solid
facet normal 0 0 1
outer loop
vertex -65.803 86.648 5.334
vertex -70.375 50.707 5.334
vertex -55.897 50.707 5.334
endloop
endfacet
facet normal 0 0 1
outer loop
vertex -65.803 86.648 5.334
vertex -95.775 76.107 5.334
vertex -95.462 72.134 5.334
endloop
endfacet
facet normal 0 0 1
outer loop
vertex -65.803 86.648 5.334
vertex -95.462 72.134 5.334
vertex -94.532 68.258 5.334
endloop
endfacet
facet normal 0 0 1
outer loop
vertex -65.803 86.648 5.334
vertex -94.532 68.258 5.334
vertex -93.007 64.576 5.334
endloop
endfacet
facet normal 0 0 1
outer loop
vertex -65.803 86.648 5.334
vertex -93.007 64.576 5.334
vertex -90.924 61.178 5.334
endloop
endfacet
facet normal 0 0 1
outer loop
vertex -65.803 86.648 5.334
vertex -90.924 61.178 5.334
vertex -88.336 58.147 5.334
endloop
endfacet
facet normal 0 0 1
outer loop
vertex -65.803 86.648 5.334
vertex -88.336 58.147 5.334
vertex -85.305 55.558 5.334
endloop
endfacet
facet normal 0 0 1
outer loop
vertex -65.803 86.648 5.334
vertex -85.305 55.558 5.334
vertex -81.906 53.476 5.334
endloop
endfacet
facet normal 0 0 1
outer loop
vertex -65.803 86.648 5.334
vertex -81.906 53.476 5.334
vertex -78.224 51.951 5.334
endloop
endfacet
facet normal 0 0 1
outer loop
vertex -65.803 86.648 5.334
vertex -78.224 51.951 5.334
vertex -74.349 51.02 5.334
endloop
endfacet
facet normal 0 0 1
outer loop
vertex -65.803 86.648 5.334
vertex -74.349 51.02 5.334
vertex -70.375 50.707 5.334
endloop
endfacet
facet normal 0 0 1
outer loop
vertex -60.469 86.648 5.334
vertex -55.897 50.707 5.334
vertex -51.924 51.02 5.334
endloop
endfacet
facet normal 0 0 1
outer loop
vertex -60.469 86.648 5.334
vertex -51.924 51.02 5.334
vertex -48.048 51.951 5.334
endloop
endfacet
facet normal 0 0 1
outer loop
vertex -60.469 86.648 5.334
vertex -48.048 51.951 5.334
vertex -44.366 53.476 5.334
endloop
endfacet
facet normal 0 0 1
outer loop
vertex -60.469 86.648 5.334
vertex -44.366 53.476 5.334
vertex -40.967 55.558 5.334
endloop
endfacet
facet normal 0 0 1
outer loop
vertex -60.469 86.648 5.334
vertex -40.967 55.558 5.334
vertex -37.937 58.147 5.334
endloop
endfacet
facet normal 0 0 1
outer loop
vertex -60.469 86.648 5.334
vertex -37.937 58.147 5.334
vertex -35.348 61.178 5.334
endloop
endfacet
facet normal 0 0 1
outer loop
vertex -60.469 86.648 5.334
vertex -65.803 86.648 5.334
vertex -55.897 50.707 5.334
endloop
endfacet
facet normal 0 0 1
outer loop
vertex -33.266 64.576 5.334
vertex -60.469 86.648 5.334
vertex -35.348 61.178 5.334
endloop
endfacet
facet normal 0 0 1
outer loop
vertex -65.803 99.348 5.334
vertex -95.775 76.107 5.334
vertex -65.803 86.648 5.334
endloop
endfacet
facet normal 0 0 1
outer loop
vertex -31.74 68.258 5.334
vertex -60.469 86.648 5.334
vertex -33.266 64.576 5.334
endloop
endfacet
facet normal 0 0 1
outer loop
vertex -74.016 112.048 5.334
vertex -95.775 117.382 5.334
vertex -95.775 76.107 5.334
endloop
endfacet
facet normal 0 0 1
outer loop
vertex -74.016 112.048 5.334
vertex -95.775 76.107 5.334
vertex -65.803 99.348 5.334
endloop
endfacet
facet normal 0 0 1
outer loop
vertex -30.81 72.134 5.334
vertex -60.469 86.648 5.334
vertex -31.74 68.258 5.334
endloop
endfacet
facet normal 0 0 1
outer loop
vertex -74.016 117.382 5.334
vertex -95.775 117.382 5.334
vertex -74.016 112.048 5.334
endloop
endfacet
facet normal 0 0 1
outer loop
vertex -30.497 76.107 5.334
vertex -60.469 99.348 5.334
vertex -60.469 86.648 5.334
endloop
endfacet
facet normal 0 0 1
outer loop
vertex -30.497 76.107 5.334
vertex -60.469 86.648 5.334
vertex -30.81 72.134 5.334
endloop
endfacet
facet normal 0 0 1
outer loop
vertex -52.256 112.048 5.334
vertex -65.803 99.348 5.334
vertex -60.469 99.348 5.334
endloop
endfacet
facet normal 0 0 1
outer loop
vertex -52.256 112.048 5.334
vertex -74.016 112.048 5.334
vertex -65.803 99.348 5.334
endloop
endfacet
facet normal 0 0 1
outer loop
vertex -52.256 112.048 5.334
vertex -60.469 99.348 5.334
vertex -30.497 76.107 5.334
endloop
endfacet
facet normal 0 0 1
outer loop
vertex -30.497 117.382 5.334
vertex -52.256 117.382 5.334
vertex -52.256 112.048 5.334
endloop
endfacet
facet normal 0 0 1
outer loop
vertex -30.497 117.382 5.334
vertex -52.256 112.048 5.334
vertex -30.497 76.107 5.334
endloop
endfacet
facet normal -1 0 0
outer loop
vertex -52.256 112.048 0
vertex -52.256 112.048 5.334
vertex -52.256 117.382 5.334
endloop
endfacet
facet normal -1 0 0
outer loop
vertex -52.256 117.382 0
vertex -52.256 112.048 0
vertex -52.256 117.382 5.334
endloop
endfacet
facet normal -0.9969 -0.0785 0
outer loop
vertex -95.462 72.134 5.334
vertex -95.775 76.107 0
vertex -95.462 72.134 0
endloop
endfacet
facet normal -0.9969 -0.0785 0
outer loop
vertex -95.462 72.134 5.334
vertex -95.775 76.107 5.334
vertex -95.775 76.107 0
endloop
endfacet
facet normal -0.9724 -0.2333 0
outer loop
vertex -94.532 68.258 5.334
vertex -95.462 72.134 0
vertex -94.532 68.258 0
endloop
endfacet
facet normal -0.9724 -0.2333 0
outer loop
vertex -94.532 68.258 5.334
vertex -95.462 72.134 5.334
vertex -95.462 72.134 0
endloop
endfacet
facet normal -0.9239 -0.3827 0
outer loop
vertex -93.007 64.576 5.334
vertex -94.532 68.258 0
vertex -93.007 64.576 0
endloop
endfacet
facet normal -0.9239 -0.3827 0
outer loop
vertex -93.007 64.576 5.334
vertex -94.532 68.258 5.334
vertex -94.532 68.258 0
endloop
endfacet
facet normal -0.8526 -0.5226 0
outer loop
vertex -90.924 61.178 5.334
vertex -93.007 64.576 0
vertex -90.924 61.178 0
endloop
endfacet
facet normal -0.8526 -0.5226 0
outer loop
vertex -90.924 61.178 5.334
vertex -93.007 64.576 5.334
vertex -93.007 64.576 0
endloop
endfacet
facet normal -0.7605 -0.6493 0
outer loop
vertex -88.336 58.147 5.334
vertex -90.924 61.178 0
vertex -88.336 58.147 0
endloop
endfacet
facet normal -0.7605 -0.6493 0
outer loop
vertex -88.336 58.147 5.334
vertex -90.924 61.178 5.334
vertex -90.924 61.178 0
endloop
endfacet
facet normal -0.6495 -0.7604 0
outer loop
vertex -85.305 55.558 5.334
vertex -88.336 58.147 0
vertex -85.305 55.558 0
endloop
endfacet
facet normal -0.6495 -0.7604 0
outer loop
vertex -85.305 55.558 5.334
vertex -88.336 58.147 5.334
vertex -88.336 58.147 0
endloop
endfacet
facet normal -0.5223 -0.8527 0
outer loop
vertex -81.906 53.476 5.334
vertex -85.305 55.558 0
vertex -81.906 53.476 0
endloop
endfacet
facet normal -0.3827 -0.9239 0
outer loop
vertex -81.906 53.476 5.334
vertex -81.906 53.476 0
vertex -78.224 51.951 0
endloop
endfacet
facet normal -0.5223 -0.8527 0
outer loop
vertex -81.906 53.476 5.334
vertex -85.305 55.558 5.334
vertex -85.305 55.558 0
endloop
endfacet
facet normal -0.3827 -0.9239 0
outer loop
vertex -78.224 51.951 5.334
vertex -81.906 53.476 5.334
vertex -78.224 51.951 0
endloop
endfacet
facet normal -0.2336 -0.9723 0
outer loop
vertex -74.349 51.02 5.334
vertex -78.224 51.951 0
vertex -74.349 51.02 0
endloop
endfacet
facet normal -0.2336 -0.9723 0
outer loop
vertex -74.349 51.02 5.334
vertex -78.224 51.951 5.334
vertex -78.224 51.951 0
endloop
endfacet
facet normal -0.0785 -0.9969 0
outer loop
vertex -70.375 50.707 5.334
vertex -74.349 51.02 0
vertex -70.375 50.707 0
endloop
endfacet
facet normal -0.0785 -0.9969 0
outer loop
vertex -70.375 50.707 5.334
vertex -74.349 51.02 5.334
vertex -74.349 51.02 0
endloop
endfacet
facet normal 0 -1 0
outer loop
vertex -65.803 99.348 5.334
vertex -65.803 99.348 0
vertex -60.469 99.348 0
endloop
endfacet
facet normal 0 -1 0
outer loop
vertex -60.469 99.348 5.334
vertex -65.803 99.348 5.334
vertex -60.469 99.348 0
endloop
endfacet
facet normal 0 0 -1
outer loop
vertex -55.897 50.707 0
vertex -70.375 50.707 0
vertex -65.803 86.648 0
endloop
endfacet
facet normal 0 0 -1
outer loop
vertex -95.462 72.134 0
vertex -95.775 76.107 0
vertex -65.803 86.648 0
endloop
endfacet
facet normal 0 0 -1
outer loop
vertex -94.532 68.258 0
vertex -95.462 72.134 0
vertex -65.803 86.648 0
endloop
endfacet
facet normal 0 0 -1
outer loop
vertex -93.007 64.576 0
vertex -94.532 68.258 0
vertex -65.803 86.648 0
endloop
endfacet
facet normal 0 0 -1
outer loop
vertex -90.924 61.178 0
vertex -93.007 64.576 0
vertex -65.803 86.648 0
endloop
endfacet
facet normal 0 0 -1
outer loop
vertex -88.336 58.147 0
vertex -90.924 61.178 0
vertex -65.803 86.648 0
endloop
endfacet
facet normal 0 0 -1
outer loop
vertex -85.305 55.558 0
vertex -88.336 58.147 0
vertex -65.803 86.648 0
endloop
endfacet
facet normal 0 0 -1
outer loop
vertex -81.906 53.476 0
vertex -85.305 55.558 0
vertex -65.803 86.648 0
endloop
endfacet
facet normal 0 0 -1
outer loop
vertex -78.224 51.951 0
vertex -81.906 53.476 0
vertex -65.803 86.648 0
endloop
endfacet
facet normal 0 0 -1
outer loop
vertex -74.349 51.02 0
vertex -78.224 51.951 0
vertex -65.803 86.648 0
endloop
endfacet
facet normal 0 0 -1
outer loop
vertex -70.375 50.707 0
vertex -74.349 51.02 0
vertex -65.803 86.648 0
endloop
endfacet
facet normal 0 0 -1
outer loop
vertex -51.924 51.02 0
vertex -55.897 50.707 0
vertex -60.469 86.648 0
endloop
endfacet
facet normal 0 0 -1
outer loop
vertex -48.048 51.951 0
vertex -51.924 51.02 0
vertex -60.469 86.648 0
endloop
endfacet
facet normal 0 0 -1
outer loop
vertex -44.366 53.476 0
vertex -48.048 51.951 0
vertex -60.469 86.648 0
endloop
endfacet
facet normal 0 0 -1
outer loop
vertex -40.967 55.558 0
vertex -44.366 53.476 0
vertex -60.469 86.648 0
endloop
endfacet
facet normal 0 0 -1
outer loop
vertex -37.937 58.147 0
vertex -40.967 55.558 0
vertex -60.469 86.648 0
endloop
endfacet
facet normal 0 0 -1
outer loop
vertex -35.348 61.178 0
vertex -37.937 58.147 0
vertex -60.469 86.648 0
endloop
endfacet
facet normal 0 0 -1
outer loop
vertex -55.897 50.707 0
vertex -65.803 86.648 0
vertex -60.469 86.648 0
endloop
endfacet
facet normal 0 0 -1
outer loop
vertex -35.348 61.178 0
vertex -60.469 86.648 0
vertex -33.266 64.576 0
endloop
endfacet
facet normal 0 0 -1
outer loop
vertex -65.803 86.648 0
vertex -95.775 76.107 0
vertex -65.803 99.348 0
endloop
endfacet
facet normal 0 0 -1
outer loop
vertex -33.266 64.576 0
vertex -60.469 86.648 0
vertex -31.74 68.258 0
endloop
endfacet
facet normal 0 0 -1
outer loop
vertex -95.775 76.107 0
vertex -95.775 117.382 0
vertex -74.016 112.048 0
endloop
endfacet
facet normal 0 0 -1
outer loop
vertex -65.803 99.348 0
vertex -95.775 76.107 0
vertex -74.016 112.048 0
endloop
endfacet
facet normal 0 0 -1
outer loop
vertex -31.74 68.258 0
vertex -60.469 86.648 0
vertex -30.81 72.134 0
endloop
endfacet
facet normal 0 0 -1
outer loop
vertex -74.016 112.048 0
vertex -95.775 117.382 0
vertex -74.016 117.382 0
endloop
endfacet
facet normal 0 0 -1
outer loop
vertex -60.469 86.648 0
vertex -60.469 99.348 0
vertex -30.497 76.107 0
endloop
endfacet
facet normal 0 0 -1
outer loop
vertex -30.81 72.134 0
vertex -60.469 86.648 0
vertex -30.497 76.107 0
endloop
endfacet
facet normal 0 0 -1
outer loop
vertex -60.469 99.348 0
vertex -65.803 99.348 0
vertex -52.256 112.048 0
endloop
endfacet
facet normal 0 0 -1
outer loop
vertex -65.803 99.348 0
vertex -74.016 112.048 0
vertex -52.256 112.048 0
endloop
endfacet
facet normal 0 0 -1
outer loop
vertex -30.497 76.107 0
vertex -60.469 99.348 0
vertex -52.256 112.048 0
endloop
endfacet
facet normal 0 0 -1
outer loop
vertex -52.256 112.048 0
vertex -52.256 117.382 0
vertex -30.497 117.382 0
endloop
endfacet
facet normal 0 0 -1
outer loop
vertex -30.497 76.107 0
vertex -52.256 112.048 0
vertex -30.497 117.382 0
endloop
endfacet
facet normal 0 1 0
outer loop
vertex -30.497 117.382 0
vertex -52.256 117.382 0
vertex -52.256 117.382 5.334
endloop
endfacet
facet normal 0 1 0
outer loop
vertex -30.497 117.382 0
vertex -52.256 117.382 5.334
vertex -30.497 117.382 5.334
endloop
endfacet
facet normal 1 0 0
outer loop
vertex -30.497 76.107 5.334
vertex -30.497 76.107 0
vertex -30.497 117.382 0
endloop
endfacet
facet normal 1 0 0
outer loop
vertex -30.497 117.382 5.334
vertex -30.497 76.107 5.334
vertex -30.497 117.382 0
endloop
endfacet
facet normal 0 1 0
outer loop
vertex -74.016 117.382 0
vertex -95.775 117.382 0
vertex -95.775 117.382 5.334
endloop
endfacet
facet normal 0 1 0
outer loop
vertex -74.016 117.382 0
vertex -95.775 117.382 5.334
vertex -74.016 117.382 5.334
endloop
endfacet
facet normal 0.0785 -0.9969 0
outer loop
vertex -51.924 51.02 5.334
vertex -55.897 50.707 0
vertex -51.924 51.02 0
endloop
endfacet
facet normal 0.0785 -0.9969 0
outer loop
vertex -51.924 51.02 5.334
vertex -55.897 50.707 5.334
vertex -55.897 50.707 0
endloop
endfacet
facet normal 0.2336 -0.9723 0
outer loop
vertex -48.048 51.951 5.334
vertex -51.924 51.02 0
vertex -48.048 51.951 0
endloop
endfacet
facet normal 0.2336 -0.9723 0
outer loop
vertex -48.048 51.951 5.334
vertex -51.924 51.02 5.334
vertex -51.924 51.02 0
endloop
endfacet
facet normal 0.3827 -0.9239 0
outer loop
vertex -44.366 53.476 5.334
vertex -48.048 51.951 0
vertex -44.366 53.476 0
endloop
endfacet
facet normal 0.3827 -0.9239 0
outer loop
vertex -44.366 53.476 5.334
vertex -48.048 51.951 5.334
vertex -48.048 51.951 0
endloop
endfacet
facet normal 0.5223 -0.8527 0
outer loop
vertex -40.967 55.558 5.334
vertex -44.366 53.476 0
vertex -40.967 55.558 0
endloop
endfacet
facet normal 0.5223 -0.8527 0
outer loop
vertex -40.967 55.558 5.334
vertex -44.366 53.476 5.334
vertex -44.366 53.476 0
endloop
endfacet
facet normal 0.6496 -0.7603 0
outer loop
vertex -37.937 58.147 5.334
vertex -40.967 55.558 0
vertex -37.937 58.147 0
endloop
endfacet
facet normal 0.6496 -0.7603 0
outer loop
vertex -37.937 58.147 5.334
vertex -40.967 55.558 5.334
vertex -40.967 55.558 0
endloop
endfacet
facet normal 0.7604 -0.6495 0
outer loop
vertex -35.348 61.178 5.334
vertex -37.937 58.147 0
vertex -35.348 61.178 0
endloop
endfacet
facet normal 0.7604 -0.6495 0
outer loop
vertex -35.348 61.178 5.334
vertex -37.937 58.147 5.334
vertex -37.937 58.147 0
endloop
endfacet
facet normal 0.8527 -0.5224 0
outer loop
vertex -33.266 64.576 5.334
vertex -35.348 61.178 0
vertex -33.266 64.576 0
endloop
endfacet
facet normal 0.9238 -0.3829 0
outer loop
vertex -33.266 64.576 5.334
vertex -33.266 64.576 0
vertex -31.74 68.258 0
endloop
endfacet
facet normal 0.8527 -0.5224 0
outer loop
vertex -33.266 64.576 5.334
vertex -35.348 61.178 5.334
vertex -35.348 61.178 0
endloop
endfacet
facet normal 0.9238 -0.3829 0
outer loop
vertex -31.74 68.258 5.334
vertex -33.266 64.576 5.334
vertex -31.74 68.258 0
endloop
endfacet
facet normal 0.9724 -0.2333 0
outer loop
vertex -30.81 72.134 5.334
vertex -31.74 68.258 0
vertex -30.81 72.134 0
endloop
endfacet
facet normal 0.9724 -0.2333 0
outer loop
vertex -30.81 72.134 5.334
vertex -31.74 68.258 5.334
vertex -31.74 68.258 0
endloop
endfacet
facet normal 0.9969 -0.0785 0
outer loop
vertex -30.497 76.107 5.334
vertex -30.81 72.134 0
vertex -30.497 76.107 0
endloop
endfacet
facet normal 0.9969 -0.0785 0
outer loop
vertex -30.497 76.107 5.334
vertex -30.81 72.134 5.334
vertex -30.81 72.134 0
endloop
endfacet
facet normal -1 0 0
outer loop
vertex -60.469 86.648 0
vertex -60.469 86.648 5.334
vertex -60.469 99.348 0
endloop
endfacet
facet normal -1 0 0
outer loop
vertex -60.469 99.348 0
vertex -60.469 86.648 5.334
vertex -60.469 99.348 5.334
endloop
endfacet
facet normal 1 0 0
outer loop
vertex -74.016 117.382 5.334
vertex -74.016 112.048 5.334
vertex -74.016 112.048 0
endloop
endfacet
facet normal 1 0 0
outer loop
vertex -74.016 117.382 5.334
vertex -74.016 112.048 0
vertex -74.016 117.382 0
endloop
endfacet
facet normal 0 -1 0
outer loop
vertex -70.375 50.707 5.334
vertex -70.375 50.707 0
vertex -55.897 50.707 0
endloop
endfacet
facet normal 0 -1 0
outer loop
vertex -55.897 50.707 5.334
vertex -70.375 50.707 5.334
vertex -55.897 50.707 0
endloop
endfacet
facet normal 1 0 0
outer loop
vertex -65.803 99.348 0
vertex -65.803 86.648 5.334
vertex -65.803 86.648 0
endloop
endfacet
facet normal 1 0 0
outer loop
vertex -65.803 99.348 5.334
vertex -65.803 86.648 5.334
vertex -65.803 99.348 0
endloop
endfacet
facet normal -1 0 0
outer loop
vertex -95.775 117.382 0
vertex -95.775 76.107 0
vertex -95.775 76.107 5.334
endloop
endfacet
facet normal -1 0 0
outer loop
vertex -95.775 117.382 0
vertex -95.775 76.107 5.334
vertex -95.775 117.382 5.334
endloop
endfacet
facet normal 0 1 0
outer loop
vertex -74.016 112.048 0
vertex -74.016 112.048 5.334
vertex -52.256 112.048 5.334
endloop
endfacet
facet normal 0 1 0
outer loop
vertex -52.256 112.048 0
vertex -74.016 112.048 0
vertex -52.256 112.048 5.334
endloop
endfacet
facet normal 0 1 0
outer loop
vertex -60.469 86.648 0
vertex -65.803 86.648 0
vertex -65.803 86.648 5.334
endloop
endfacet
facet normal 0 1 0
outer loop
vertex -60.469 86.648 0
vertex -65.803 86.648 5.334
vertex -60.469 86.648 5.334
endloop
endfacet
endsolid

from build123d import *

# Parameters (mm, degrees)
SKETCH1_W           = 65.278
SKETCH1_H           = 66.675
BOSS_EXTRUDE1_DEPTH = 5.334
SKETCH2_W           = 21.759333334
SKETCH2_H           = 5.334
CUT_EXTRUDE1_DEPTH  = 152.591443439
FILLET1_R           = 25.4
FILLET2_R           = 25.4
SKETCH3_W           = 5.334
SKETCH3_H           = 12.7
CUT_EXTRUDE2_DEPTH  = 152.591443439


with BuildPart() as part:
    # Sketch1 → Boss-Extrude1 (new body)
    with BuildSketch(Plane.XY):
        with Locations((-63.136117913, 84.044955915)):
            Rectangle(SKETCH1_W, SKETCH1_H)
    extrude(amount=BOSS_EXTRUDE1_DEPTH)

    # Sketch2 → Cut-Extrude1 (cut, through all)
    with BuildSketch(Plane.XY.offset(5.334)):
        with Locations((-63.136117913, 114.715455915)):
            Rectangle(SKETCH2_W, SKETCH2_H)
    extrude(amount=-CUT_EXTRUDE1_DEPTH, mode=Mode.SUBTRACT)

    # Fillet1
    fillet1_edges = [part.edges().sort_by_distance(p)[0] for p in [
        (-95.775117913, 50.707455915, 2.667),
    ]]
    fillet(fillet1_edges, radius=FILLET1_R)

    # Fillet2
    fillet2_edges = [part.edges().sort_by_distance(p)[0] for p in [
        (-30.497117913, 50.707455915, 2.667),
    ]]
    fillet(fillet2_edges, radius=FILLET2_R)

    # Sketch3 → Cut-Extrude2 (cut, through all)
    with BuildSketch(Plane.XY.offset(5.334)):
        with Locations((-63.136117913, 92.998455915)):
            Rectangle(SKETCH3_W, SKETCH3_H)
    extrude(amount=-CUT_EXTRUDE2_DEPTH, mode=Mode.SUBTRACT)


solid = part.part
